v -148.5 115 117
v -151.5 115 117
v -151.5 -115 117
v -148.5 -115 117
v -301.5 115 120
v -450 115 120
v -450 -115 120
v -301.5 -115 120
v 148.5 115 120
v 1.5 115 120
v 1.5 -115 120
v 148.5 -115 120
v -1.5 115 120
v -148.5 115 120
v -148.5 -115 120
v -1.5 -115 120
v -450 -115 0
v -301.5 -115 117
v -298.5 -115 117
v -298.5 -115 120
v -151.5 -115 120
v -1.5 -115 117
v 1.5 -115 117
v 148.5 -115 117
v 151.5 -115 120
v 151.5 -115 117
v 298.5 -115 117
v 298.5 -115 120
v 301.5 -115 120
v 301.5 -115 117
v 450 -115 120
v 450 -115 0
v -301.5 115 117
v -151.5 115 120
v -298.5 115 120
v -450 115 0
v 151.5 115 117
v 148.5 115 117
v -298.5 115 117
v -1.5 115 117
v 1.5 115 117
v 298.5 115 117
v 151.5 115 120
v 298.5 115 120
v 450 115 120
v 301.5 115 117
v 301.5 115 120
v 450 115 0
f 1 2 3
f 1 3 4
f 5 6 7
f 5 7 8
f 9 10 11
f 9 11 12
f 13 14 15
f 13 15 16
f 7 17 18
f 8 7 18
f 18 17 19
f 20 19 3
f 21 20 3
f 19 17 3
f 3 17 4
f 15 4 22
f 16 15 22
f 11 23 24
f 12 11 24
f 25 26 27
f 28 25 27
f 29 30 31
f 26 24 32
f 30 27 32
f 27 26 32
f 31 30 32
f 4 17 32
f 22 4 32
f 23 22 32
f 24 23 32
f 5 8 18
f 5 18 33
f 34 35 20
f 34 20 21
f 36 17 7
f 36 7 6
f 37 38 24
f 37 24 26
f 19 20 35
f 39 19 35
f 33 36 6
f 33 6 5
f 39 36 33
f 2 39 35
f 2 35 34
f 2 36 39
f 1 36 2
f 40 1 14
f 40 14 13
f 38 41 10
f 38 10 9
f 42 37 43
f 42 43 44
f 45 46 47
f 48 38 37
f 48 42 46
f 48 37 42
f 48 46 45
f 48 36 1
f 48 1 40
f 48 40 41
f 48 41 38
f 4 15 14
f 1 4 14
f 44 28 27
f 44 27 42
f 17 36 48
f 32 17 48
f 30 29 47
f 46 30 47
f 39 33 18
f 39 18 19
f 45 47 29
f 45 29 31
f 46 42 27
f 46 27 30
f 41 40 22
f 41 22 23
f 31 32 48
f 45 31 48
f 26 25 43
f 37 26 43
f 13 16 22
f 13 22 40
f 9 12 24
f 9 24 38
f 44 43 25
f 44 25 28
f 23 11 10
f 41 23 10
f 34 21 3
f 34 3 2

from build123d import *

# Parameters (mm, degrees)
SKETCH1_W           = 900
SKETCH1_H           = 230
BOSS_EXTRUDE1_DEPTH = 120
SKETCH2_W           = 3
SKETCH2_H           = 230
CUT_EXTRUDE1_DEPTH  = 3


with BuildPart() as part:
    # Sketch1 → Boss-Extrude1 (new body)
    with BuildSketch(Plane.XY):
        Rectangle(SKETCH1_W, SKETCH1_H)
    extrude(amount=BOSS_EXTRUDE1_DEPTH)

    # Sketch2 → Cut-Extrude1 (cut)
    with BuildSketch(Plane.XY.offset(120)):
        with Locations((-300, 0)):
            Rectangle(SKETCH2_W, SKETCH2_H)
        with Locations((-150, 0)):
            Rectangle(SKETCH2_W, SKETCH2_H)
        Rectangle(SKETCH2_W, SKETCH2_H)
        with Locations((150, 0)):
            Rectangle(SKETCH2_W, SKETCH2_H)
        with Locations((300, 0)):
            Rectangle(SKETCH2_W, SKETCH2_H)
    extrude(amount=-CUT_EXTRUDE1_DEPTH, mode=Mode.SUBTRACT)


solid = part.part
